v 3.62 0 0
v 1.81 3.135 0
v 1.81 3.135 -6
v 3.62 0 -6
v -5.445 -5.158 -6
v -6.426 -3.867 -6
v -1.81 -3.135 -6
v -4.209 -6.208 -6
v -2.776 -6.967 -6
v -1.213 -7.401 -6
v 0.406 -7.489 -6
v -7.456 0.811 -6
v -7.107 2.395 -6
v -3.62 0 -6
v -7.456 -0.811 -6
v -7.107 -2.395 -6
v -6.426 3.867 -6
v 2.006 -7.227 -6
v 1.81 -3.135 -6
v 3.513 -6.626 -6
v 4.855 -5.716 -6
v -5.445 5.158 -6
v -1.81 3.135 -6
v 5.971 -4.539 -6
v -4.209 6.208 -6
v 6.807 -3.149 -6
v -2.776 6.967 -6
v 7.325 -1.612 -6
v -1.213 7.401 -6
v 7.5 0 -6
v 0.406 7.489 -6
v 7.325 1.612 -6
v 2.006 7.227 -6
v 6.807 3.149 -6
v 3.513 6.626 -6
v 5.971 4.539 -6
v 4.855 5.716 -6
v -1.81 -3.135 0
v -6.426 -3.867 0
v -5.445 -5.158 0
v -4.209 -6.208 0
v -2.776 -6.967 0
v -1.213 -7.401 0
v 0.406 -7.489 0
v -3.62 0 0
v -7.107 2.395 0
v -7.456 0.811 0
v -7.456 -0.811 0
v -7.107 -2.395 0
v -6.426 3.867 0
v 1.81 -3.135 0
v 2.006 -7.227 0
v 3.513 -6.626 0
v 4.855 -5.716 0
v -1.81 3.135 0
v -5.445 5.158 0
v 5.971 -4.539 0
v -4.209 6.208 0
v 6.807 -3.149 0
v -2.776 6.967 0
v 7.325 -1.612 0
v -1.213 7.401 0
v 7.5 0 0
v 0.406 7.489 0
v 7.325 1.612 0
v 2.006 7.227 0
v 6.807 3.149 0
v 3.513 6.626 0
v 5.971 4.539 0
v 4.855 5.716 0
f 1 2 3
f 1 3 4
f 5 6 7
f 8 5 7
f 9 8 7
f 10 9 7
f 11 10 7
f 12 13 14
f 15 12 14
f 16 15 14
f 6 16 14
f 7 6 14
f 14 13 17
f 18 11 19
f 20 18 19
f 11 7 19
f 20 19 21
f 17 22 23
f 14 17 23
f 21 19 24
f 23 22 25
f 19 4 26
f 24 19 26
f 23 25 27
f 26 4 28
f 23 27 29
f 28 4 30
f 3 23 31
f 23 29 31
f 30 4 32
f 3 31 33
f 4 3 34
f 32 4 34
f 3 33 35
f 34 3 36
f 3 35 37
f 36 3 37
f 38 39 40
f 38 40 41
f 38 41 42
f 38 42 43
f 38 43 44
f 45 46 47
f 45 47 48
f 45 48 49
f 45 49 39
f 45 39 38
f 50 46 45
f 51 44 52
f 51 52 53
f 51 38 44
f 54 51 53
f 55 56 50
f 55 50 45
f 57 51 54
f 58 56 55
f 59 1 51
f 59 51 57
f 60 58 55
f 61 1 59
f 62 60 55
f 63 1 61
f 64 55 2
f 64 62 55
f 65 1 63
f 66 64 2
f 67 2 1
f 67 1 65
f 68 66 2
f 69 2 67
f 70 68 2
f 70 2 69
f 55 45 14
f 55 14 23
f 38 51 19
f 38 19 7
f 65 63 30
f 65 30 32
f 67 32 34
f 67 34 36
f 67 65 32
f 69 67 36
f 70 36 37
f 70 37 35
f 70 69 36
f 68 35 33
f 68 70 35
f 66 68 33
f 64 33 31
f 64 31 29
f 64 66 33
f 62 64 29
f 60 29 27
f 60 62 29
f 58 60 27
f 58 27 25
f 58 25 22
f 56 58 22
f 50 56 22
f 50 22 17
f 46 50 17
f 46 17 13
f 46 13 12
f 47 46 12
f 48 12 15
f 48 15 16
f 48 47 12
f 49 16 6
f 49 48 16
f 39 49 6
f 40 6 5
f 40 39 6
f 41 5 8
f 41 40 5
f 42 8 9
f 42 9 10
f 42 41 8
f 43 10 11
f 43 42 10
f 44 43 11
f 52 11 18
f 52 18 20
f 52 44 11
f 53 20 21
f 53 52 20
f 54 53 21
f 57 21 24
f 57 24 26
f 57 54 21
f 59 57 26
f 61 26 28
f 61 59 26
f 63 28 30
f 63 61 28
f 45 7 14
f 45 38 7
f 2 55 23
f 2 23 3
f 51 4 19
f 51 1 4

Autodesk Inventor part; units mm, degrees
ref_plane "YZ Plane" through (0, 0, 0) normal (1, 0, 0) x (0, 1, 0)
ref_plane "XZ Plane" through (0, 0, 0) normal (0, 1, 0) x (-1, 0, 0)
ref_plane "XY Plane" through (0, 0, 0) normal (0, 0, 1) x (1, 0, 0)
sketch "Sketch1" plane through (0, 0, 0) normal (0, 0, 1) x (1, 0, 0)
  line L0 (-1.6732, 2.8981) -> (1.6732, 2.8981) projected
  line L1 (-3.3464, 0) -> (-1.6732, 2.8981) projected
  line L2 (-1.6732, -2.8981) -> (-3.3464, 0) projected
  line L3 (1.6732, -2.8981) -> (-1.6732, -2.8981) projected
  line L4 (3.3464, 0) -> (1.6732, -2.8981) projected
  line L5 (1.6732, 2.8981) -> (3.3464, 0) projected
  circle A0 centre (0, 0) radius 7.5
extrude "Extrusion1" add sketch "Sketch1" against normal blind 6
sketch "Sketch2" plane through (0, 0, 0) normal (0, 0, 1) x (1, 0, 0)
  circle A0 centre (0, 0) radius 7.5 projected
  line L0 (0, 0) -> (-3.1, 0) construction
  line L1 (0, 0) -> (-1.55, -2.6847) construction
  line L2 (0, 0) -> (1.55, -2.6847) construction
  line L3 (0, 0) -> (3.1, 0) construction
  line L4 (0, 0) -> (1.55, 2.6847) construction
  line L5 (0, 0) -> (-1.55, 2.6847) construction
  line L6 (1.55, 2.6847) -> (-1.55, 2.6847) construction
  line L7 (1.6732, 2.8981) -> (-1.6732, 2.8981) projected
  line L8 (-1.55, 2.6847) -> (-3.1, 0) construction
  line L9 (1.55, -2.6847) -> (-1.55, -2.6847) construction
  line L10 (-1.6732, -2.8981) -> (1.6732, -2.8981) projected
  line L11 (-1.55, -2.6847) -> (-3.1, 0) construction
  line L12 (1.55, -2.6847) -> (3.1, 0) construction
  line L13 (3.1, 0) -> (1.55, 2.6847) construction
  line L14 (3.3464, 0) -> (1.6732, 2.8981) projected
  line L15 (-1.8098, 3.1347) -> (1.8098, 3.1347)
  line L16 (1.8098, 3.1347) -> (3.6196, 0)
  line L17 (3.6196, 0) -> (1.8098, -3.1347)
  line L18 (1.8098, -3.1347) -> (-1.8098, -3.1347)
  line L19 (-1.8098, -3.1347) -> (-3.6196, 0)
  line L20 (-3.6196, 0) -> (-1.8098, 3.1347)
  point P0 (0, 0)
  dimension "d4" = 3.1
  dimension "d7" = 360
  dimension "d9" = 0.45
extrude "Extrusion2" cut sketch "Sketch2" against normal blind 10 contours L15 L16 L17 L18 L19 L20
properties part number "Rodamiento_Ejes"
